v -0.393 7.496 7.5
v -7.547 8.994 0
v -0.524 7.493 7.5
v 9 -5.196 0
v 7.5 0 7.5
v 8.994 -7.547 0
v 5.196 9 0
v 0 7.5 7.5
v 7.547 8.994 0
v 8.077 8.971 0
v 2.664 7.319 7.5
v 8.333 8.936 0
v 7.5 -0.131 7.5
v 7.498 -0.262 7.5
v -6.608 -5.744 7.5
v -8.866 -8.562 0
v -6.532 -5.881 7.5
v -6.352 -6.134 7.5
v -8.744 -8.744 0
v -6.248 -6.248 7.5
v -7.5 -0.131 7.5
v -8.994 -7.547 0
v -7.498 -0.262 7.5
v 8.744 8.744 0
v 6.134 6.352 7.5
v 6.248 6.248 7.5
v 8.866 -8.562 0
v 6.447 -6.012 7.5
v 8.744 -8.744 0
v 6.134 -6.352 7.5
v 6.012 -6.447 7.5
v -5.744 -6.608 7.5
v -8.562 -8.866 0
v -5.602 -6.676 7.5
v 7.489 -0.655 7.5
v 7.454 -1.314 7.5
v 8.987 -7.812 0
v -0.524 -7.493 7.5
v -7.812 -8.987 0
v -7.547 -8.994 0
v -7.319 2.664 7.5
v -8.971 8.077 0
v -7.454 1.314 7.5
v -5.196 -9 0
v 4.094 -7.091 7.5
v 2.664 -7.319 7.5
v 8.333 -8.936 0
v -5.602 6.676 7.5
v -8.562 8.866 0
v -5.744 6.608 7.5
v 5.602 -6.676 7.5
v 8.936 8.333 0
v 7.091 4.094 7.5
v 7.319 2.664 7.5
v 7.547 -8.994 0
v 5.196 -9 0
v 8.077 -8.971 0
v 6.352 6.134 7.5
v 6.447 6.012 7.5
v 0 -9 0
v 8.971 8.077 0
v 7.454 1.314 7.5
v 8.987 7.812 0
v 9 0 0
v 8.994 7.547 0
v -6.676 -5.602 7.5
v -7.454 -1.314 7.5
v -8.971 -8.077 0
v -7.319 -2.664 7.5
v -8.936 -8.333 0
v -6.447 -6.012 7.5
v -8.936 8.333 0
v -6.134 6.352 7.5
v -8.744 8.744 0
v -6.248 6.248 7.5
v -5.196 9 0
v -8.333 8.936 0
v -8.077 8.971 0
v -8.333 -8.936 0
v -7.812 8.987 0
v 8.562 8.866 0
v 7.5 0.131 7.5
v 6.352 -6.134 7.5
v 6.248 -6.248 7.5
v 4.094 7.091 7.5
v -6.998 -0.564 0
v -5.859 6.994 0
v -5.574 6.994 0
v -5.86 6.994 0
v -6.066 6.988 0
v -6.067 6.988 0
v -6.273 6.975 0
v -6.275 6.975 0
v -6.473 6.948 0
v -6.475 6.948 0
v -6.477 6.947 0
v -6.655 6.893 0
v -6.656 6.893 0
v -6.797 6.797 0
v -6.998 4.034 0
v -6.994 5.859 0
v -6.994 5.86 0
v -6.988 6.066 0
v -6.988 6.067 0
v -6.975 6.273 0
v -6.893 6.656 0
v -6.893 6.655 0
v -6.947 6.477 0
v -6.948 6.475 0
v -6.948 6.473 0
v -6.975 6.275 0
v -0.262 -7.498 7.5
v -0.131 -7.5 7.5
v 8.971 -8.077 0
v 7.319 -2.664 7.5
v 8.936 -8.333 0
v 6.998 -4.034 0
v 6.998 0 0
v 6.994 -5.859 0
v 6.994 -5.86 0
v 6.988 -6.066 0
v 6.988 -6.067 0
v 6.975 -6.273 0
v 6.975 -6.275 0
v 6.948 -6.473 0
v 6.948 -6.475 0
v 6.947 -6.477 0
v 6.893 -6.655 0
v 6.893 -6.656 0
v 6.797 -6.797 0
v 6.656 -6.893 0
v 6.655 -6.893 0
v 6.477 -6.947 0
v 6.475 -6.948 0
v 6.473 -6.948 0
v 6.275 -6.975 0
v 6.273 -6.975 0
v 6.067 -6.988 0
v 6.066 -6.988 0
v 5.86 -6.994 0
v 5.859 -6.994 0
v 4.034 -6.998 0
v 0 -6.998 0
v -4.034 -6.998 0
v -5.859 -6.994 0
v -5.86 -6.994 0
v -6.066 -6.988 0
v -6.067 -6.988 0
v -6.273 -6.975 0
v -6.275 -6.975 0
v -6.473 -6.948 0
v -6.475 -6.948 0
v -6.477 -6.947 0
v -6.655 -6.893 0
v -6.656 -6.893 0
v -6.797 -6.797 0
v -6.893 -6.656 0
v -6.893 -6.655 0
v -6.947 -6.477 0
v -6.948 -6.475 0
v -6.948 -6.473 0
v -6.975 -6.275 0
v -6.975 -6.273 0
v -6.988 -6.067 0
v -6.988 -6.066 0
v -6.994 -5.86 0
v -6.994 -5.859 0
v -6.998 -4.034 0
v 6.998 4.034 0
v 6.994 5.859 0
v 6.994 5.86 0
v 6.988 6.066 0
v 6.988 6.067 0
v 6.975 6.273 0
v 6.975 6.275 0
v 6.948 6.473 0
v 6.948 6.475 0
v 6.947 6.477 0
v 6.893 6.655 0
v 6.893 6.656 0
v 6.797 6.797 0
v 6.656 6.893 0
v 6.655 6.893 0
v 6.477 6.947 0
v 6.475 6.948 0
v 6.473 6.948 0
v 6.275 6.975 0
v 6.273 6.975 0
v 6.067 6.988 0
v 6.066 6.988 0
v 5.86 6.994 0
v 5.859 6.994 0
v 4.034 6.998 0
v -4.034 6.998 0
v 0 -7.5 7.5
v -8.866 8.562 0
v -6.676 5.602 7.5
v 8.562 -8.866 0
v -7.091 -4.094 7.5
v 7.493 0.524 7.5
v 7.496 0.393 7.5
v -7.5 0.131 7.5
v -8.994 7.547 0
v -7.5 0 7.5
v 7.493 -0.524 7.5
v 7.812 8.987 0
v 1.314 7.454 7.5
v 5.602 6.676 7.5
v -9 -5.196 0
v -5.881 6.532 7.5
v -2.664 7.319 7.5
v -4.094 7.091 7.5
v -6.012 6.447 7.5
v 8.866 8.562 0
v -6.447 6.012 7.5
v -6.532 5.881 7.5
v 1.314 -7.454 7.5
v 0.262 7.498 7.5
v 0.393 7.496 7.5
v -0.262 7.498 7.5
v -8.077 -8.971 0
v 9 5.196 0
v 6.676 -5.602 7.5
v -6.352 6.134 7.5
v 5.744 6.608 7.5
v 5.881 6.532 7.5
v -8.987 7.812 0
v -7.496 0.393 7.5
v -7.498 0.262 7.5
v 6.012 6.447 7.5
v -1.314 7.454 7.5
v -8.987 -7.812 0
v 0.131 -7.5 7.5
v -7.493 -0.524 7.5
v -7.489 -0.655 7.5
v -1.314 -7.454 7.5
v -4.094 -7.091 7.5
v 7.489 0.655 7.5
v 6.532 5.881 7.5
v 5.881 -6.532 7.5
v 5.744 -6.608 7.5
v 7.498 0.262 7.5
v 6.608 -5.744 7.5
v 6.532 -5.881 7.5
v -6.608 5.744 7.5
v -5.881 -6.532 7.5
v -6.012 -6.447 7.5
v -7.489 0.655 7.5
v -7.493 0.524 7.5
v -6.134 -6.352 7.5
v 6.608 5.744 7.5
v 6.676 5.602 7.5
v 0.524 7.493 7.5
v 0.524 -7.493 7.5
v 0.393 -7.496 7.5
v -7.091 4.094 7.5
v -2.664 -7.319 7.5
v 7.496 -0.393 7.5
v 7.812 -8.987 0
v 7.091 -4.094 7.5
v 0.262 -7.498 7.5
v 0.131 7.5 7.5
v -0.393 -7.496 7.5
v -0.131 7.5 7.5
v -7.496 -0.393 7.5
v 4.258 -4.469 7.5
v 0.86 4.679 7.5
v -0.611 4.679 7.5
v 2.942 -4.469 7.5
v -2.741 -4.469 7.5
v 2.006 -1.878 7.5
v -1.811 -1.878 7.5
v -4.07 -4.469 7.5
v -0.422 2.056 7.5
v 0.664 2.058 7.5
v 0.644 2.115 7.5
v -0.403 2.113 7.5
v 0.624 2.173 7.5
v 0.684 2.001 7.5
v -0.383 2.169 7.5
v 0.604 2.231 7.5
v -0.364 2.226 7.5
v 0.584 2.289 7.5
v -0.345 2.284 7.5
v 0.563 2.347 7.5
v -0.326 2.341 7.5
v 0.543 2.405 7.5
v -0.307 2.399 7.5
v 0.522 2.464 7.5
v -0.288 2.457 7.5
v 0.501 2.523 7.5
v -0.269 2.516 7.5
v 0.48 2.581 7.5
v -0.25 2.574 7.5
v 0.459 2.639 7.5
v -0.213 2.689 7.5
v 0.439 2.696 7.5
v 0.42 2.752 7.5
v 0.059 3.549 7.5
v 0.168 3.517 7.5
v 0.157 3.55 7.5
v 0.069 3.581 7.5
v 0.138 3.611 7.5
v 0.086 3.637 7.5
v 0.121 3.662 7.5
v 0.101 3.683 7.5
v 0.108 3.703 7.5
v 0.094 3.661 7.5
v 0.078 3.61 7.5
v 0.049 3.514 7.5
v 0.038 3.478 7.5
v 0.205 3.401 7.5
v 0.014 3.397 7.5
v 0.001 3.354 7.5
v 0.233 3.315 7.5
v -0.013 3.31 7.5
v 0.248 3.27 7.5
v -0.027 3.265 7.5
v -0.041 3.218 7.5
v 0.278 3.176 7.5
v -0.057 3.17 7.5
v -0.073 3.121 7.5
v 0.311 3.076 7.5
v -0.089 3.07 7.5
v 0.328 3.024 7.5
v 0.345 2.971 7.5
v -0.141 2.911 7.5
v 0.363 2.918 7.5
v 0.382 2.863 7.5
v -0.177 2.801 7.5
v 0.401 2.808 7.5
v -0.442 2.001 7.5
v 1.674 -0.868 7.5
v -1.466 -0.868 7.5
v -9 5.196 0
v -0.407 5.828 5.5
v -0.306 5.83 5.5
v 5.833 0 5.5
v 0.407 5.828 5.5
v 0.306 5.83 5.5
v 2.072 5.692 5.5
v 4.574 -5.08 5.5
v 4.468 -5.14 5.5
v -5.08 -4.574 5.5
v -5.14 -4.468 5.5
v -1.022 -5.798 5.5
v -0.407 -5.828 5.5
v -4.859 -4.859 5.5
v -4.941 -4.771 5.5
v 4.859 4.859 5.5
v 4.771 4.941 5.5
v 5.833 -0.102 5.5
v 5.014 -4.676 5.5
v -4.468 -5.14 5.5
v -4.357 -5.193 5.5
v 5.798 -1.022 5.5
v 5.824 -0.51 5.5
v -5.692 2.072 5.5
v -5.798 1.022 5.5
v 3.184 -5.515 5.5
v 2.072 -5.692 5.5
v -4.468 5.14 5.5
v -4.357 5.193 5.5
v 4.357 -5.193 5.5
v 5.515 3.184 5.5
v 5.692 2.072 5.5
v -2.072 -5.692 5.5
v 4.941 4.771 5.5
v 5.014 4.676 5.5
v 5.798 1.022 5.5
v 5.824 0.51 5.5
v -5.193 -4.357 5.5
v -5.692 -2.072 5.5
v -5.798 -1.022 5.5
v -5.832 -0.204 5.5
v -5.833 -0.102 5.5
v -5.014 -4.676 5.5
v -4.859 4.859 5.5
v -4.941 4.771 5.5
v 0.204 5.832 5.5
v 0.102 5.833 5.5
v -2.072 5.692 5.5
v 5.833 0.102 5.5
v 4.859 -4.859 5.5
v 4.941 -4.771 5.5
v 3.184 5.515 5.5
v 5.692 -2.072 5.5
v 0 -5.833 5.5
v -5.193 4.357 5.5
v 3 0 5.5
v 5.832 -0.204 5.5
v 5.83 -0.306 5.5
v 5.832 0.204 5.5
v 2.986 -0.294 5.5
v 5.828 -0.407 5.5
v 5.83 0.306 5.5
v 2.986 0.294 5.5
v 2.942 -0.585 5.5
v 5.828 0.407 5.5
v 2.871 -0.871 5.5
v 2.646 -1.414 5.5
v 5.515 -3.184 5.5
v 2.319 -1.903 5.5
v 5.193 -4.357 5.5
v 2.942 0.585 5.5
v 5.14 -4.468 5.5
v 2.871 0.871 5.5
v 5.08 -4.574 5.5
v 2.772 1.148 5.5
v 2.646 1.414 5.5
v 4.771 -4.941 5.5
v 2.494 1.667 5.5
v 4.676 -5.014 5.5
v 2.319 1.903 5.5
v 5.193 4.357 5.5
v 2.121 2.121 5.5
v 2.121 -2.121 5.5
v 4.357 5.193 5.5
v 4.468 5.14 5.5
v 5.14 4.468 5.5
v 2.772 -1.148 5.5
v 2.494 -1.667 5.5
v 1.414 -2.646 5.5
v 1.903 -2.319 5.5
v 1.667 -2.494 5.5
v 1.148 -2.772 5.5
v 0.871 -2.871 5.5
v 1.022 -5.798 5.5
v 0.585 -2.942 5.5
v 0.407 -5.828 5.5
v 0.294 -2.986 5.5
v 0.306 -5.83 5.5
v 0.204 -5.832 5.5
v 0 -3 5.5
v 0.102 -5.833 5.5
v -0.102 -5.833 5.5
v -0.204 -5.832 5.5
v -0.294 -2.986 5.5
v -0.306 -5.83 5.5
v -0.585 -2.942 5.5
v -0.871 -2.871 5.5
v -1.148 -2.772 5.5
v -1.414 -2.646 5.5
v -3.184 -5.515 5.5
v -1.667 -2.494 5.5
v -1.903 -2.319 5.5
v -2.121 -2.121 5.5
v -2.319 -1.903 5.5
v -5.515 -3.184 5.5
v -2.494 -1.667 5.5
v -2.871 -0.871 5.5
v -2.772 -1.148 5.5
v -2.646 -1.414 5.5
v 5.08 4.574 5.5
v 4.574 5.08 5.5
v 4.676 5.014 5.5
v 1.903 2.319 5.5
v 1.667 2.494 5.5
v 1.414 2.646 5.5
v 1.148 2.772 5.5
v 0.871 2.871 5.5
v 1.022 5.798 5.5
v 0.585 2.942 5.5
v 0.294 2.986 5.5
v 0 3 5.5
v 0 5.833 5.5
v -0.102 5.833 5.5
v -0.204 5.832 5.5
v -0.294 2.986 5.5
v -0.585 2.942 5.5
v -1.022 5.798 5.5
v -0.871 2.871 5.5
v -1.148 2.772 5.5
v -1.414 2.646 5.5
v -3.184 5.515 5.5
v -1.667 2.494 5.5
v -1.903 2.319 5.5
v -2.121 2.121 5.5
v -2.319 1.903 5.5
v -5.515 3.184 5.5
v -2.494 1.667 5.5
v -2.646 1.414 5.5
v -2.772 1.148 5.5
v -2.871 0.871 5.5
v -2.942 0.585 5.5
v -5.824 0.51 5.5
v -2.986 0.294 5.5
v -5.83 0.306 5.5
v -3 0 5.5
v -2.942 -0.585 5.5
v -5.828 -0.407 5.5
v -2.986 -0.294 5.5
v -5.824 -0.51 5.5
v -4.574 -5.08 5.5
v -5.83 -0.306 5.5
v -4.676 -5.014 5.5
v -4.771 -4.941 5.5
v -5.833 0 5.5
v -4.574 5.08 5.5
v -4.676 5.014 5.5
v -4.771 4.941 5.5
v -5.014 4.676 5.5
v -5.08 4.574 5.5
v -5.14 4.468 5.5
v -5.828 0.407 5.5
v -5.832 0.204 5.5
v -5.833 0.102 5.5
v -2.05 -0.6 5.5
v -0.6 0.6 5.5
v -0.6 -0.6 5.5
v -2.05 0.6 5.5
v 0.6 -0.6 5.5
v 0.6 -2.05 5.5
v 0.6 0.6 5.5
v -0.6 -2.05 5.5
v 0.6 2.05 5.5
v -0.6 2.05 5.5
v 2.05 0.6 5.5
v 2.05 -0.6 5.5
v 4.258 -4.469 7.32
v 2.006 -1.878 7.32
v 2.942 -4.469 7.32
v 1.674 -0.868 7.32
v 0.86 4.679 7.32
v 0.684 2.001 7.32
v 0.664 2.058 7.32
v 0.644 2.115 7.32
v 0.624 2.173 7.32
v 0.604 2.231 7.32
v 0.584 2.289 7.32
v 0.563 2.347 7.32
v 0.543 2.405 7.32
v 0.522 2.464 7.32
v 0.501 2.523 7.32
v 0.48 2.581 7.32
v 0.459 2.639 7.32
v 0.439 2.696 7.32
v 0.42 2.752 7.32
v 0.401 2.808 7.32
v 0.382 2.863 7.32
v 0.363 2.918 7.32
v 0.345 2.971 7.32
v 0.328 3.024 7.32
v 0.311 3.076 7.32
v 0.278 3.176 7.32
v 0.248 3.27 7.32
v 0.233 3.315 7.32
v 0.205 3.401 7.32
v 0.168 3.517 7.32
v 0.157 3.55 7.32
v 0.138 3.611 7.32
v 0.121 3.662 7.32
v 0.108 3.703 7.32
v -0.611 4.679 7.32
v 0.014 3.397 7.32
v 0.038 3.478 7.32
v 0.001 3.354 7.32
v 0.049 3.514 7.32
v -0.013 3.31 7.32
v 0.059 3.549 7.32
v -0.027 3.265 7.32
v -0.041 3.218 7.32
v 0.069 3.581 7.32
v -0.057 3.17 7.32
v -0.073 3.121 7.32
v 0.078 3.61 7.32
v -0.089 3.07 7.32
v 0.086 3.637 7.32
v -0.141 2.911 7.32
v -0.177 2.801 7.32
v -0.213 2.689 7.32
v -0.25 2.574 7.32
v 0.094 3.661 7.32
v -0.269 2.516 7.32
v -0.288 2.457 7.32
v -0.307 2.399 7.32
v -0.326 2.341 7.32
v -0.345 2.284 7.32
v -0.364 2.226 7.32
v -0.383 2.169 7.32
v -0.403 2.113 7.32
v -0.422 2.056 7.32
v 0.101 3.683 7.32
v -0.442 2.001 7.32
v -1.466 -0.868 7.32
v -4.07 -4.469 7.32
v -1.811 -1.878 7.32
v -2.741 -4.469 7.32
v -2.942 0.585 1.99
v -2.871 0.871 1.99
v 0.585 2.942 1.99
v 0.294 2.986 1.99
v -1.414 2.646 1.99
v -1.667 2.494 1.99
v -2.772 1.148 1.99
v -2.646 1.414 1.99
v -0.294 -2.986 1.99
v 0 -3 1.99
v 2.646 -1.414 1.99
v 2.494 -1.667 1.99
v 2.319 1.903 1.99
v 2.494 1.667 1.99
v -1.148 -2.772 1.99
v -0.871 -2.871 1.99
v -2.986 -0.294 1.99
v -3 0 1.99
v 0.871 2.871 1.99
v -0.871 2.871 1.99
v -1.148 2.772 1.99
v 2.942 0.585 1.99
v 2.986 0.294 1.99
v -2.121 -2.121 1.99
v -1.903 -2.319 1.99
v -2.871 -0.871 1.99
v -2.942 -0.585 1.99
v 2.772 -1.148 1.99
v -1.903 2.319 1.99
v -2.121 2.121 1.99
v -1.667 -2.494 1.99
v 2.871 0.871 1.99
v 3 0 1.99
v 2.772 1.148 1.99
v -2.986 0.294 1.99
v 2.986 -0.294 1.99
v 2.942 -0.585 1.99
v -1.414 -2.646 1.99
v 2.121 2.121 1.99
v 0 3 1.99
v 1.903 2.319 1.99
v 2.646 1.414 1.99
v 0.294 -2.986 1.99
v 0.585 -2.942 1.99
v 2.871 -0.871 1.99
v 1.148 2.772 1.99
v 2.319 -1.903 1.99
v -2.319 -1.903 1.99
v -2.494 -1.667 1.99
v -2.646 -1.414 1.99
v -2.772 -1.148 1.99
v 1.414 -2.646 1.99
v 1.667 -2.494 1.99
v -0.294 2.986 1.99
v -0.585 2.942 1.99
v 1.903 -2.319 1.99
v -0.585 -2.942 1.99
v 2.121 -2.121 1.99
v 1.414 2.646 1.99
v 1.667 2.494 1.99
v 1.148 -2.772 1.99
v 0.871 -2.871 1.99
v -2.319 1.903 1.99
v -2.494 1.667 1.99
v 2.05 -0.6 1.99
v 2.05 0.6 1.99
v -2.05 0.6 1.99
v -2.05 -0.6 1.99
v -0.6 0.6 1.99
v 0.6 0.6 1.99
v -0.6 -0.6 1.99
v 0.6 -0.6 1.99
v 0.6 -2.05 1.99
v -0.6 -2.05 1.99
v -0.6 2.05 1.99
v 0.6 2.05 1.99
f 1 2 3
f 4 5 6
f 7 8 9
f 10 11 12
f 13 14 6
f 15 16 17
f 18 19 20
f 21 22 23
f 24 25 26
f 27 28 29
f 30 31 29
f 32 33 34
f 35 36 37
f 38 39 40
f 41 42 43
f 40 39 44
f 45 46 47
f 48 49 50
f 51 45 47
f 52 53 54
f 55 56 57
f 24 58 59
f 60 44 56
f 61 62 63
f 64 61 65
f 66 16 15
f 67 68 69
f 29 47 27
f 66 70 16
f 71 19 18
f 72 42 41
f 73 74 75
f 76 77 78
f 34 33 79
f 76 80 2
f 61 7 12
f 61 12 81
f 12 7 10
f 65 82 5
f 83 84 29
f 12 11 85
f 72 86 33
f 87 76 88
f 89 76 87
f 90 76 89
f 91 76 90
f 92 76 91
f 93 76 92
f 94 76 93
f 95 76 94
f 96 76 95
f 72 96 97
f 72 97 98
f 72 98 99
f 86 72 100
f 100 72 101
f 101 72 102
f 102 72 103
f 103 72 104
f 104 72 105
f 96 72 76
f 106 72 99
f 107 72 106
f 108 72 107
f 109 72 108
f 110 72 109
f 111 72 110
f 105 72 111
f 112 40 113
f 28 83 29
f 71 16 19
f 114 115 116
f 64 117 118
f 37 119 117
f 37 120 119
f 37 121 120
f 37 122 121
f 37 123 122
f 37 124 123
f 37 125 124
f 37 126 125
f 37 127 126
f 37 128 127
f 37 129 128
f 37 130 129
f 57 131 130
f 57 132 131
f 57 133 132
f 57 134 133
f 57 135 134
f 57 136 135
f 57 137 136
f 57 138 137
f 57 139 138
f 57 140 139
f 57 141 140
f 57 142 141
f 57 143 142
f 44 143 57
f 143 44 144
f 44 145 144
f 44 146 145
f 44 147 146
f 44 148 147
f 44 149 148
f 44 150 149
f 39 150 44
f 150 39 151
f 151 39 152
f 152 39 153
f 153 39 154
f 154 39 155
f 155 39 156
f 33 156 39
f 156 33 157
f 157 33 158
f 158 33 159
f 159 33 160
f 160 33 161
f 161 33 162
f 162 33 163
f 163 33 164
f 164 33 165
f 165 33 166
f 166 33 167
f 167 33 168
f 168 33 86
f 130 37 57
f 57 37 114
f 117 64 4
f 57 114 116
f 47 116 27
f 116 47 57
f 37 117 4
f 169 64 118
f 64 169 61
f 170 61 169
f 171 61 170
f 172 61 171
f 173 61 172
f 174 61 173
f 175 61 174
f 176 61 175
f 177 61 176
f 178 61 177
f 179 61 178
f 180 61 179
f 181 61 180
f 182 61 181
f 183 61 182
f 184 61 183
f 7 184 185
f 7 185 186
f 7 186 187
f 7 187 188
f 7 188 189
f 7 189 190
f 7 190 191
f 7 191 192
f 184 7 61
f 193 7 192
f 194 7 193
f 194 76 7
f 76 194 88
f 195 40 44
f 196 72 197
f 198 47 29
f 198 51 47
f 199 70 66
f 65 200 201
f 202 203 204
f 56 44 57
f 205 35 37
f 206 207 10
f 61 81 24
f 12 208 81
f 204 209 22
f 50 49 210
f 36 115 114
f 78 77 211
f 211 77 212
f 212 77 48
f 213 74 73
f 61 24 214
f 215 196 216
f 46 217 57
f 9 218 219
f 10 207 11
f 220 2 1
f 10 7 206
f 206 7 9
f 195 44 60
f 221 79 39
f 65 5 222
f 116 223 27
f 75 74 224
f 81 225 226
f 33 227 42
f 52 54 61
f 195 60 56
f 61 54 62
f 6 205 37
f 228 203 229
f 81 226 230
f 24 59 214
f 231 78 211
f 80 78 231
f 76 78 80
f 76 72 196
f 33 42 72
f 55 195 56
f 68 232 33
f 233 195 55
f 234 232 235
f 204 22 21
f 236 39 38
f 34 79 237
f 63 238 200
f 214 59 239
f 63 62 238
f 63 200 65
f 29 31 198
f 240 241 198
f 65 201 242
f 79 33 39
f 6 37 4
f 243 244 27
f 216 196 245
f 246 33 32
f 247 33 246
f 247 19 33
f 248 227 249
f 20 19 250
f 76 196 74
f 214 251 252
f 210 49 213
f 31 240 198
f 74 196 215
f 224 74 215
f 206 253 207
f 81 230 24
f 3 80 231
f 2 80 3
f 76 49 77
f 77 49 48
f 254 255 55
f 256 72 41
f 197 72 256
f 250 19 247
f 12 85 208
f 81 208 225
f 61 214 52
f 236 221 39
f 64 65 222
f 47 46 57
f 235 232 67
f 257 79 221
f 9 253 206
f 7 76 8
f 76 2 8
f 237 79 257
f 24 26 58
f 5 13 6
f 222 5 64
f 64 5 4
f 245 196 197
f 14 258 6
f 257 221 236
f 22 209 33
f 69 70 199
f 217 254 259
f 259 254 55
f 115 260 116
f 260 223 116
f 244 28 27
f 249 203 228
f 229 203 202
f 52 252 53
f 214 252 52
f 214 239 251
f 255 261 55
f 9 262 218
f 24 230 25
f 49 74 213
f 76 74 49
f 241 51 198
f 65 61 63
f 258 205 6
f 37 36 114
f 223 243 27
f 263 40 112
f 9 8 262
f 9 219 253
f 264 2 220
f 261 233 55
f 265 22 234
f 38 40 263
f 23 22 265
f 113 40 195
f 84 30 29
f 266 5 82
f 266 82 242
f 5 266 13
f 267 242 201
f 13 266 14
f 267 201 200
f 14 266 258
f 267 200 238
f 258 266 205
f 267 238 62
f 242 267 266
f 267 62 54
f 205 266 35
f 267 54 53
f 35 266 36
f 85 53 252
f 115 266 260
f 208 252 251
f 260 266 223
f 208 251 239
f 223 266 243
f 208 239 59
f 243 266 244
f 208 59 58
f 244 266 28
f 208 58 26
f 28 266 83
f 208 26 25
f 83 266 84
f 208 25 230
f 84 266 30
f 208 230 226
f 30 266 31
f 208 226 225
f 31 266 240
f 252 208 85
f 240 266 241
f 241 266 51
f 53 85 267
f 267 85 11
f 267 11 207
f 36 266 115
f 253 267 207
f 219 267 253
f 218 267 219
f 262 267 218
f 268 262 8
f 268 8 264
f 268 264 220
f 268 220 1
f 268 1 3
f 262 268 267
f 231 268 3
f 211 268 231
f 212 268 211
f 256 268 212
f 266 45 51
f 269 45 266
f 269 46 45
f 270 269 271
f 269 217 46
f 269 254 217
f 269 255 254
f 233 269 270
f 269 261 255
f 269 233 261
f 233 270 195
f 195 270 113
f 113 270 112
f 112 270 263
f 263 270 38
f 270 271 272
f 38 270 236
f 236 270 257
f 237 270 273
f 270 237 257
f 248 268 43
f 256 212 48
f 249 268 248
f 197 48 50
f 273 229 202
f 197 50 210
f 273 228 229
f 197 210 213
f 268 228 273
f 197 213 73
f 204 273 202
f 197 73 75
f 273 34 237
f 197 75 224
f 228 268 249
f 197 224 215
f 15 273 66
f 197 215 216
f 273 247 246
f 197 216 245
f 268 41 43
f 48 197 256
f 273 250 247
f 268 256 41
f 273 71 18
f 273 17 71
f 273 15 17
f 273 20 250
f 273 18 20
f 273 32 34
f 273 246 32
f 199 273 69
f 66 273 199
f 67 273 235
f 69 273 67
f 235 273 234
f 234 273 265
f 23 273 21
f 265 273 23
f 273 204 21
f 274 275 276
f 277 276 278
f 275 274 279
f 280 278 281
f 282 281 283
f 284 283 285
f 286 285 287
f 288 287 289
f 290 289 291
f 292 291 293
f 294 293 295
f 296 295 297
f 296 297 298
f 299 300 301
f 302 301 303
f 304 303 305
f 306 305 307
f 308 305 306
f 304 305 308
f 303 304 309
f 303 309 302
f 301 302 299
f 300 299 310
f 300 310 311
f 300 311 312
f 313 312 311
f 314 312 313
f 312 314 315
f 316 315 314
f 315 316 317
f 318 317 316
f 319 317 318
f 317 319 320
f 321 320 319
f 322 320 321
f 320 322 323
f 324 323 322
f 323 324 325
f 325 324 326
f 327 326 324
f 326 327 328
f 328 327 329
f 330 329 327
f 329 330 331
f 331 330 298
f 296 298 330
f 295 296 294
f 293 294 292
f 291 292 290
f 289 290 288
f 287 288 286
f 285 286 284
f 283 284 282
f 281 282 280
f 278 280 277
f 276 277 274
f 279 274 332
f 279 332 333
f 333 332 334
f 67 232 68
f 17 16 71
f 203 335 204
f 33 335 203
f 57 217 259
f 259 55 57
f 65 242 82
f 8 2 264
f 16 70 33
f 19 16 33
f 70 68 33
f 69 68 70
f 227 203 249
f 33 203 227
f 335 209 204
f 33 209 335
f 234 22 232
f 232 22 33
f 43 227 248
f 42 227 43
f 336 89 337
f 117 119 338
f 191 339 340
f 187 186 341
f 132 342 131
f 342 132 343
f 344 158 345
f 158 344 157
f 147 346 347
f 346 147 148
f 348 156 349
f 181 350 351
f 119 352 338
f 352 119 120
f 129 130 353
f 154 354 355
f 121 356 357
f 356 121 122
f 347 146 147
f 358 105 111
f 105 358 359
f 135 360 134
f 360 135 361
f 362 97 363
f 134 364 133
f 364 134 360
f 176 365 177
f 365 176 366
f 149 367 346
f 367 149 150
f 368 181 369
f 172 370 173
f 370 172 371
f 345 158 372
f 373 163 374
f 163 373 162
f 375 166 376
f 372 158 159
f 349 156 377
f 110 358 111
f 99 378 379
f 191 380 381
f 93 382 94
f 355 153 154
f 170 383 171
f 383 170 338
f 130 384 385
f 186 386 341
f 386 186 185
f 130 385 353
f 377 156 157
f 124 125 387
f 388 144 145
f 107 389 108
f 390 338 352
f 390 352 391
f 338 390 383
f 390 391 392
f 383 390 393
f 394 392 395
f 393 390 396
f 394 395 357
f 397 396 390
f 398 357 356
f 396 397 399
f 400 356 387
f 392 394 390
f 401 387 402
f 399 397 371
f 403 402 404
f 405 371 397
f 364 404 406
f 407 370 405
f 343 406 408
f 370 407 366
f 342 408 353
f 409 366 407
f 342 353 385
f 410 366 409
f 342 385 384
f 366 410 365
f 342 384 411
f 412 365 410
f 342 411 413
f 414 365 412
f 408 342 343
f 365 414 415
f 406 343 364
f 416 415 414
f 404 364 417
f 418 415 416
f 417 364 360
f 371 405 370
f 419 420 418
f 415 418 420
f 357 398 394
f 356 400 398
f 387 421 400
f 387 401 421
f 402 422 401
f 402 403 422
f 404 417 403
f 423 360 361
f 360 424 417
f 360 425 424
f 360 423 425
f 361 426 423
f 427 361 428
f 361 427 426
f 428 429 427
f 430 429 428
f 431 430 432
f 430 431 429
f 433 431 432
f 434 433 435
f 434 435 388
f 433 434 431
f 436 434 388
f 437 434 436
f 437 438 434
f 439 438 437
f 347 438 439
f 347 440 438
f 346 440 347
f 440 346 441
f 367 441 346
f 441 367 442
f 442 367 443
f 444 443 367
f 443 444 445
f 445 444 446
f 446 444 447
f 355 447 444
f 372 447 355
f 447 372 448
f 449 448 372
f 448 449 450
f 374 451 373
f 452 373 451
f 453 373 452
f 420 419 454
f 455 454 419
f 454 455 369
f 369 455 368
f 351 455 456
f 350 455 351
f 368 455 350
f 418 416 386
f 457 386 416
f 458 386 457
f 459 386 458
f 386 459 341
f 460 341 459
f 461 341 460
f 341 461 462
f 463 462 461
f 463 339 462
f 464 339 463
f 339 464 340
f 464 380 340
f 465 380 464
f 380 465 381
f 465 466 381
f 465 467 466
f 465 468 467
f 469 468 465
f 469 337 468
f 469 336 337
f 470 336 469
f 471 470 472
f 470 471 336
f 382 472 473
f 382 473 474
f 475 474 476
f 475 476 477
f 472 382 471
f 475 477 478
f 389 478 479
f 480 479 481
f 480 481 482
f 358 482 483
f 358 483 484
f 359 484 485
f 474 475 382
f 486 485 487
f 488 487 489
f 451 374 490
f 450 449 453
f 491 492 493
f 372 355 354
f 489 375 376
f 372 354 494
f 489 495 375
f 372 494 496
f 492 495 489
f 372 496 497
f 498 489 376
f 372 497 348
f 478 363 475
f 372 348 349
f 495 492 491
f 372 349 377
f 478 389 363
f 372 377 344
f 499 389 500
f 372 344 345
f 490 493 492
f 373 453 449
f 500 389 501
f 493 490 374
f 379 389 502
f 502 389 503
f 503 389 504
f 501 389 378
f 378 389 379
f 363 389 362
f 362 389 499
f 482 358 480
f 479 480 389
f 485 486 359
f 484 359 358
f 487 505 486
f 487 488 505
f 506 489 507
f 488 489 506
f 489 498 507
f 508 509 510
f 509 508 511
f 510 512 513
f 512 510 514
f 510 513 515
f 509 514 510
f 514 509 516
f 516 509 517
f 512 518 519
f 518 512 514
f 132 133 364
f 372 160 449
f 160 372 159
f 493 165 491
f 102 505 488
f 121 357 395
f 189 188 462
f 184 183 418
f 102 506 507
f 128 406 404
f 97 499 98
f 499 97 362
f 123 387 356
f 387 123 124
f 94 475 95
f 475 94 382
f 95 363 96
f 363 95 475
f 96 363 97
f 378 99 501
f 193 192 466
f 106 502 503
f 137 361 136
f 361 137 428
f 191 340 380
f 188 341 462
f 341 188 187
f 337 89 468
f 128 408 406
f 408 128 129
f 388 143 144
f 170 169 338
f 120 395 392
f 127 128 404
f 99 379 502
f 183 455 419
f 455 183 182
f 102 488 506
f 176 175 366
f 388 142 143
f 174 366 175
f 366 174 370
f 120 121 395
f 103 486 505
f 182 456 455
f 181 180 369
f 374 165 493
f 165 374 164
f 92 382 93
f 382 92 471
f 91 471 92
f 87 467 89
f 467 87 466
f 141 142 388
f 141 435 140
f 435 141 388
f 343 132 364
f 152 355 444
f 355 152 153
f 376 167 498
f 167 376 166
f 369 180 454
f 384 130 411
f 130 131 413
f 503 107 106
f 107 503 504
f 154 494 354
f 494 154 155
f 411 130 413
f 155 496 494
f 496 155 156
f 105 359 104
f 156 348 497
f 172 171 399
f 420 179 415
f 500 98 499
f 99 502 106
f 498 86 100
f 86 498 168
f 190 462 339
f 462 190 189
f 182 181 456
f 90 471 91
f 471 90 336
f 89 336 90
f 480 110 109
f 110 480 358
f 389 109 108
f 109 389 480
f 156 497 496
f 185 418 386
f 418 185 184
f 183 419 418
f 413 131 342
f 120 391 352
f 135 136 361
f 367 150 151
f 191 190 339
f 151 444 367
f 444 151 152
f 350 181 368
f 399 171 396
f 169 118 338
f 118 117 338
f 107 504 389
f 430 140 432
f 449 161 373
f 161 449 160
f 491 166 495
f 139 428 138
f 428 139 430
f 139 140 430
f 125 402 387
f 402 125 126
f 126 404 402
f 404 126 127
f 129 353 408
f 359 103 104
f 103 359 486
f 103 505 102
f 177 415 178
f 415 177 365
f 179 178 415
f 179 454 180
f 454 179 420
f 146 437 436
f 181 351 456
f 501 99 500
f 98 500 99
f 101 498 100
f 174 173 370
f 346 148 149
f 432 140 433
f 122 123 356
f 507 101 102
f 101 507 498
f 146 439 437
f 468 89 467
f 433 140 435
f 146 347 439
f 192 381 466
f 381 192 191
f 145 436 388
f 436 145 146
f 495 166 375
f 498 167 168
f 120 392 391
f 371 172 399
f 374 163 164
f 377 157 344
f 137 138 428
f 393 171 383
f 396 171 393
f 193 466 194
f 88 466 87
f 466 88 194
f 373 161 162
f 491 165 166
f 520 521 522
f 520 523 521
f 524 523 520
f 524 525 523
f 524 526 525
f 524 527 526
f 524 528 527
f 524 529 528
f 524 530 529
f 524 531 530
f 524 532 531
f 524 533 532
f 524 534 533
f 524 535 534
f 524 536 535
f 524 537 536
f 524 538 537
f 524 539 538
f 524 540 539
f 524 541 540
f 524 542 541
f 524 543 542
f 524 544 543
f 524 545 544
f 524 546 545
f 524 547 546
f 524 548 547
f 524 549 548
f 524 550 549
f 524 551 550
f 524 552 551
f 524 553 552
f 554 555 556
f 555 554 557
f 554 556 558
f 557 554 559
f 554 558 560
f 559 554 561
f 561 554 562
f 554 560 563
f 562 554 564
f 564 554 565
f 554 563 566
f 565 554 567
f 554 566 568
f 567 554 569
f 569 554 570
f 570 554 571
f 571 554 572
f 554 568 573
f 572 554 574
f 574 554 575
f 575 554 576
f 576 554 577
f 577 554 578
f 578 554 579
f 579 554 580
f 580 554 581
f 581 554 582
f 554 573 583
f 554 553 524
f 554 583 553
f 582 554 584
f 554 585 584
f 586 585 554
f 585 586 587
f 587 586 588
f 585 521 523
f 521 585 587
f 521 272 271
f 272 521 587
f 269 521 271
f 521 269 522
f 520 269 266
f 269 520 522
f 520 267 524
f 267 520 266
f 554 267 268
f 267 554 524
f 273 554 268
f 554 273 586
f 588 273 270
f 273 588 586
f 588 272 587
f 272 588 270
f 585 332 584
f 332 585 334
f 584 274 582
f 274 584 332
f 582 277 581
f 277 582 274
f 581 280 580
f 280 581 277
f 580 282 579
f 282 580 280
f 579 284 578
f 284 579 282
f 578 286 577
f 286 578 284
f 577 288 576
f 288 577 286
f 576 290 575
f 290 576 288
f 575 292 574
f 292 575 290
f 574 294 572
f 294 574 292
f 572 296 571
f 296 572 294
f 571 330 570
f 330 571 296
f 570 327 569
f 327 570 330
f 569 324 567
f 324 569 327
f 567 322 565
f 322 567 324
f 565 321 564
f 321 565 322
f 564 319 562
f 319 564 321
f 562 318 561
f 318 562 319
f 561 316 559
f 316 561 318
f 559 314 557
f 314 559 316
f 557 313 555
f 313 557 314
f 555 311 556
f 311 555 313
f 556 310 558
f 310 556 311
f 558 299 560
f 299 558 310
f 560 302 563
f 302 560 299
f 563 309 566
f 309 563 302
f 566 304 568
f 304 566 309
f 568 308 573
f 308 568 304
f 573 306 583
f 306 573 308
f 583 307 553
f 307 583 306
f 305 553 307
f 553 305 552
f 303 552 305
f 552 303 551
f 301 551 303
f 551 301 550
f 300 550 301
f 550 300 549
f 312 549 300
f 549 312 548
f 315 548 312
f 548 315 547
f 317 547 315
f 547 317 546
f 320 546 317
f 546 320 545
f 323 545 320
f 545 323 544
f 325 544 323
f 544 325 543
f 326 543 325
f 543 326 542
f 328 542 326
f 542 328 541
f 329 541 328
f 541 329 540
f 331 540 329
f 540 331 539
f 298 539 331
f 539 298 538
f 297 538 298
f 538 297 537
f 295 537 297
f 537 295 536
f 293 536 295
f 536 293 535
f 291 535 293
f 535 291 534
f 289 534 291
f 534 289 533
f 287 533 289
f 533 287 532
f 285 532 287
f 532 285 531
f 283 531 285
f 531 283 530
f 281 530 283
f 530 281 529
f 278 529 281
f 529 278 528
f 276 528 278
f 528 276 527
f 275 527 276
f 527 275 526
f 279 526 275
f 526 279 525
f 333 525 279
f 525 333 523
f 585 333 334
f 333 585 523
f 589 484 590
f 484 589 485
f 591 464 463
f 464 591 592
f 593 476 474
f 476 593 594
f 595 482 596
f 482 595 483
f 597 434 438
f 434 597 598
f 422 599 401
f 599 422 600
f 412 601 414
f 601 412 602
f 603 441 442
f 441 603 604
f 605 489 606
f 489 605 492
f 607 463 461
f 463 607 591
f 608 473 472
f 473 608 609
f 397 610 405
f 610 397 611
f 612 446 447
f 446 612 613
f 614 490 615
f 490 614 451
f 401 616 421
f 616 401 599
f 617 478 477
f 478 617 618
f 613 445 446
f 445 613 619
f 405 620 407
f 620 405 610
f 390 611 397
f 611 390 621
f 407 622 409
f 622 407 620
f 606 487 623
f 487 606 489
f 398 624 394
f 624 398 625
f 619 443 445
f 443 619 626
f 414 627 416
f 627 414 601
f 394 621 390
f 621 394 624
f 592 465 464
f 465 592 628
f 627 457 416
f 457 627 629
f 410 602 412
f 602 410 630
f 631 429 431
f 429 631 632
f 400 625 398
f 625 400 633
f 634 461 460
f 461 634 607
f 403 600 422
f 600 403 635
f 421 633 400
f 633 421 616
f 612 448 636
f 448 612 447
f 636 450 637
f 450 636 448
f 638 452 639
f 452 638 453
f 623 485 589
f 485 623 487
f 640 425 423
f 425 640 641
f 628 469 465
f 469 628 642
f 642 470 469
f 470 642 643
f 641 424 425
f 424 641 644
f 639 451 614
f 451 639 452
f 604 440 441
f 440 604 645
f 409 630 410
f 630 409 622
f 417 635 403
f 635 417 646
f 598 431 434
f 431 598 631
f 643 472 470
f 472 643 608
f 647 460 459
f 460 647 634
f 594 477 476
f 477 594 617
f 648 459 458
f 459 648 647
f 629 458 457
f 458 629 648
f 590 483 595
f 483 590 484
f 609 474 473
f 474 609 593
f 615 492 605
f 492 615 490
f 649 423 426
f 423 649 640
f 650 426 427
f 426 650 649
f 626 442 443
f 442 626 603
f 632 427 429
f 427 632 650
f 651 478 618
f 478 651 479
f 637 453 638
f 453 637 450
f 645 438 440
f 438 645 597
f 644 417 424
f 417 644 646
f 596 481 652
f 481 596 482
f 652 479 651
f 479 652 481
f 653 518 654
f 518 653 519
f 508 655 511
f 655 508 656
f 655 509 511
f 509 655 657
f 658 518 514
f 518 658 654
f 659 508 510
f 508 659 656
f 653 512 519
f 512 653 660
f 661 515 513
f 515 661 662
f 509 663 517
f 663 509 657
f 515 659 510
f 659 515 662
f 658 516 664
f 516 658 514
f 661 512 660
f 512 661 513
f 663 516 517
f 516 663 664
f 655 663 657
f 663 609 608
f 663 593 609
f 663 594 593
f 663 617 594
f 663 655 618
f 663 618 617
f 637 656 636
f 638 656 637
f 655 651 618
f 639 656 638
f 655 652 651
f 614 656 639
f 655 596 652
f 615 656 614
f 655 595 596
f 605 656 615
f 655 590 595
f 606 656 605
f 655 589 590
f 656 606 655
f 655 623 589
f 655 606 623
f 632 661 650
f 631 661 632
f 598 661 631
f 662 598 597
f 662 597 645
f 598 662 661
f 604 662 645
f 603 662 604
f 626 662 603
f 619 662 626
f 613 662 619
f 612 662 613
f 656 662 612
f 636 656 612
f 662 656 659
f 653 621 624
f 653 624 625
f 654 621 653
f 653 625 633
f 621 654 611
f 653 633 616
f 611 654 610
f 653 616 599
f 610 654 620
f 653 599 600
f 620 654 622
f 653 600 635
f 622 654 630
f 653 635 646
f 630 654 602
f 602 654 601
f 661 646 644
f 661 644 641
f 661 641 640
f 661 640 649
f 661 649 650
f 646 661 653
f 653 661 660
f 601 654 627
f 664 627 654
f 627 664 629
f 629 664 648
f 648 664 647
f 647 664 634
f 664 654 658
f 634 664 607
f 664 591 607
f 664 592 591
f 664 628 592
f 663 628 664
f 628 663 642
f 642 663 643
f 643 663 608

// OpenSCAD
// Author: https://github.com/metalinspired/
// Original implementation: https://aileron.me/scad/keycap

/* [Keycap shell] */
keycap_height = 7.5;                // .1
top_size = 15.0;                    // .1
top_roundness = 0.0;                // [-2:.1:2]
top_roundness_negative_scale = 0.0; // [0:.1:2]
top_corner_roundness = 4;           // [1 : 15]
top_thickness = 2.0;                // .1
top_angle = 0.0;                    // .1
bottom_size = 18.0;                 // .1
bottom_corner_roundness = 12;       // [1 : 15]
walls_thickness = 2.0;              // .1
extrusion = 0.0;                    // .1

/* [Label] */
label_content = "A";
label_depth = .2;     // .1
label_font_size = 10; // 1
label_x_offset = 0.0; // .1
label_y_offset = 0.0; // .1
label_font = "Liberation Mono";
label_font_segments = 64;
label_rotation = 0; // [0:1:360]

/* [Stem] */
// Stem offset from the bottom
stem_offset = 2.0;       // .1
stem_shaft_radius = 3.0; // .1
// Width of the stem cross
stem_cross_width = 4.1; // .1
// width of the stem gutter
stem_gutter_width = 1.2; // .1
stem_count = 1;          // 1
// How far individual stems are one from another when more than one is used
stem_distance = 30.0; // .1

function rsquircle(t, p) = 1 / pow(pow(cos(t), 2 * p) + pow(sin(t), 2 * p), 0.5 / p);

function quarter_squircle(roundness, size, square_blend = 0.6) = [for (t = [0:1:90]) if (
    t % 10 == 0 ||
    (t + 50) % 45 <
        10)[size * (1 - square_blend + rsquircle(t, roundness) * square_blend) * cos(t),
            (size * (1 - square_blend + rsquircle(t, roundness) * square_blend) * sin(t)) + (extrusion / 2)]];

function half_squircle(quarter_squircle) = let(cnt = len(quarter_squircle) - 1)
    concat(quarter_squircle, [for (i = [0:cnt])[quarter_squircle[cnt - i][0], 0 - quarter_squircle[cnt - i][1]]]);

function squircle(half_squircle) = concat(half_squircle, [for (v = half_squircle)[0 - v[0], 0 - v[1]]]);

module cap(top_half)
{
    resize(newsize = [ top_size, top_size + extrusion, abs(top_roundness) ]) rotate(a = 90, v = [ 1, 0, 0 ])
        rotate_extrude(angle = 180, convexity = 10, $fn = 30) polygon(points = top_half);
}

module keycap_shell(rounded = false)
{
    top_half = half_squircle(quarter_squircle(roundness = top_corner_roundness, size = top_size / 2));
    rotate(a = 90, v = [ 0, 0, 1 ]) difference()
    {
        calculated_keycap_height = keycap_height + (rounded && top_roundness < 0 ? abs(top_roundness) : 0);
        hull()
        {
            translate(v = [ 0, 0, calculated_keycap_height ]) rotate(a = top_angle, v = [ 0, -1, 0 ])
            {
                if (rounded && top_roundness > 0)
                {
                    cap(top_half = top_half);
                }
                else
                {
                    linear_extrude(0.000001) polygon(squircle(top_half));
                }
            }
            linear_extrude(0.000001) polygon(squircle(half_squircle(
                quarter_squircle(roundness = bottom_corner_roundness, size = bottom_size / 2, square_blend = 1))));
        }
        if (rounded && top_roundness < 0)
        {
            translate(v = [ 0, 0, calculated_keycap_height + 0.01 ]) rotate(a = top_angle, v = [ 0, -1, 0 ])
                rotate(a = 180, v = [ 1, 0, 0 ])
                    scale(v = [ 1 + (top_roundness_negative_scale / 10), 1 + (top_roundness_negative_scale / 10), 1 ])
                        cap(top_half);
        }
    }
}

module keycap()
{
    // Keycap shell
    label_z_offset_1 = top_roundness > 0 ? top_roundness : 0;
    label_z_offset_2 = keycap_height + (top_roundness < 0 ? abs(top_roundness) : 0) - label_depth + 0.02;
    color("white") difference()
    {
        keycap_shell(top_roundness != 0);
        translate(v = [ 0, 0, -0.01 ]) resize(newsize = [
            bottom_size + extrusion - (walls_thickness * 2), bottom_size - (walls_thickness * 2),
            keycap_height - top_thickness + 0.01
        ]) keycap_shell();

        // Key label
        if (label_content != "" && label_depth > 0)
        {
            translate(v = [ label_x_offset, label_y_offset, label_z_offset_2 ]) rotate(a = top_angle, v = [ 1, 0, 0 ])
                translate(v = [ 0, 0, label_z_offset_1 ]) linear_extrude(height = label_depth)
                    rotate(a = label_rotation, v = [ 0, 0, 1 ])
                        text(label_content, size = label_font_size, halign = "center", valign = "center",
                             font = label_font, $fn = label_font_segments);
        }
    }
    // Key label highlight
    if ($preview && label_content != "" && label_depth > 0)
    {
        color("blue") translate(v = [ label_x_offset, label_y_offset, label_z_offset_2 ])
            rotate(a = top_angle, v = [ 1, 0, 0 ]) translate(v = [ 0, 0, label_z_offset_1 ])
                linear_extrude(height = 0.000001) rotate(a = label_rotation, v = [ 0, 0, 1 ])
                    text(label_content, size = label_font_size, halign = "center", valign = "center", font = label_font,
                         $fn = label_font_segments);
    }
    // Stem shaft
    stem_shaft = [ stem_cross_width, stem_gutter_width, keycap_height ];
    stem_gutter_offset = [ -stem_cross_width / 2, -stem_gutter_width / 2, -0.01 ];
    stem_count = stem_count >= 1 ? stem_count : 1;
    stem_cutoff_block_size = [ stem_shaft_radius * 2 + 0.05, bottom_size ];
    translate(v = [ -(stem_distance * (stem_count - 1)) / 2, 0, 0 ]) for (i = [1:stem_count])
    {
        translate(v = [ stem_distance * (i - 1), 0, 0 ]) difference()
        {
            $fn = 64;
            cylinder(h = keycap_height + 3, r = stem_shaft_radius, center = false);
            hull()
            {
                translate(v = [ 0, 0, keycap_height + 4 ]) linear_extrude(height = 0.01)
                    square(size = stem_cutoff_block_size, center = true);
                translate(v = [ 0, 0, keycap_height - top_thickness + 0.01 ]) rotate(a = top_angle, v = [ 1, 0, 0 ])
                    linear_extrude(height = 0.01) square(size = stem_cutoff_block_size, center = true);
            }
            translate(v = stem_gutter_offset) cube(size = stem_shaft, center = false);
            rotate(a = 90, v = [ 0, 0, 1 ]) translate(v = stem_gutter_offset) cube(size = stem_shaft, center = false);
            translate(v = [ 0, 0, -0.01 ]) linear_extrude(height = stem_offset) circle(r = stem_shaft_radius + 0.05);
        }
    }
}

keycap();
